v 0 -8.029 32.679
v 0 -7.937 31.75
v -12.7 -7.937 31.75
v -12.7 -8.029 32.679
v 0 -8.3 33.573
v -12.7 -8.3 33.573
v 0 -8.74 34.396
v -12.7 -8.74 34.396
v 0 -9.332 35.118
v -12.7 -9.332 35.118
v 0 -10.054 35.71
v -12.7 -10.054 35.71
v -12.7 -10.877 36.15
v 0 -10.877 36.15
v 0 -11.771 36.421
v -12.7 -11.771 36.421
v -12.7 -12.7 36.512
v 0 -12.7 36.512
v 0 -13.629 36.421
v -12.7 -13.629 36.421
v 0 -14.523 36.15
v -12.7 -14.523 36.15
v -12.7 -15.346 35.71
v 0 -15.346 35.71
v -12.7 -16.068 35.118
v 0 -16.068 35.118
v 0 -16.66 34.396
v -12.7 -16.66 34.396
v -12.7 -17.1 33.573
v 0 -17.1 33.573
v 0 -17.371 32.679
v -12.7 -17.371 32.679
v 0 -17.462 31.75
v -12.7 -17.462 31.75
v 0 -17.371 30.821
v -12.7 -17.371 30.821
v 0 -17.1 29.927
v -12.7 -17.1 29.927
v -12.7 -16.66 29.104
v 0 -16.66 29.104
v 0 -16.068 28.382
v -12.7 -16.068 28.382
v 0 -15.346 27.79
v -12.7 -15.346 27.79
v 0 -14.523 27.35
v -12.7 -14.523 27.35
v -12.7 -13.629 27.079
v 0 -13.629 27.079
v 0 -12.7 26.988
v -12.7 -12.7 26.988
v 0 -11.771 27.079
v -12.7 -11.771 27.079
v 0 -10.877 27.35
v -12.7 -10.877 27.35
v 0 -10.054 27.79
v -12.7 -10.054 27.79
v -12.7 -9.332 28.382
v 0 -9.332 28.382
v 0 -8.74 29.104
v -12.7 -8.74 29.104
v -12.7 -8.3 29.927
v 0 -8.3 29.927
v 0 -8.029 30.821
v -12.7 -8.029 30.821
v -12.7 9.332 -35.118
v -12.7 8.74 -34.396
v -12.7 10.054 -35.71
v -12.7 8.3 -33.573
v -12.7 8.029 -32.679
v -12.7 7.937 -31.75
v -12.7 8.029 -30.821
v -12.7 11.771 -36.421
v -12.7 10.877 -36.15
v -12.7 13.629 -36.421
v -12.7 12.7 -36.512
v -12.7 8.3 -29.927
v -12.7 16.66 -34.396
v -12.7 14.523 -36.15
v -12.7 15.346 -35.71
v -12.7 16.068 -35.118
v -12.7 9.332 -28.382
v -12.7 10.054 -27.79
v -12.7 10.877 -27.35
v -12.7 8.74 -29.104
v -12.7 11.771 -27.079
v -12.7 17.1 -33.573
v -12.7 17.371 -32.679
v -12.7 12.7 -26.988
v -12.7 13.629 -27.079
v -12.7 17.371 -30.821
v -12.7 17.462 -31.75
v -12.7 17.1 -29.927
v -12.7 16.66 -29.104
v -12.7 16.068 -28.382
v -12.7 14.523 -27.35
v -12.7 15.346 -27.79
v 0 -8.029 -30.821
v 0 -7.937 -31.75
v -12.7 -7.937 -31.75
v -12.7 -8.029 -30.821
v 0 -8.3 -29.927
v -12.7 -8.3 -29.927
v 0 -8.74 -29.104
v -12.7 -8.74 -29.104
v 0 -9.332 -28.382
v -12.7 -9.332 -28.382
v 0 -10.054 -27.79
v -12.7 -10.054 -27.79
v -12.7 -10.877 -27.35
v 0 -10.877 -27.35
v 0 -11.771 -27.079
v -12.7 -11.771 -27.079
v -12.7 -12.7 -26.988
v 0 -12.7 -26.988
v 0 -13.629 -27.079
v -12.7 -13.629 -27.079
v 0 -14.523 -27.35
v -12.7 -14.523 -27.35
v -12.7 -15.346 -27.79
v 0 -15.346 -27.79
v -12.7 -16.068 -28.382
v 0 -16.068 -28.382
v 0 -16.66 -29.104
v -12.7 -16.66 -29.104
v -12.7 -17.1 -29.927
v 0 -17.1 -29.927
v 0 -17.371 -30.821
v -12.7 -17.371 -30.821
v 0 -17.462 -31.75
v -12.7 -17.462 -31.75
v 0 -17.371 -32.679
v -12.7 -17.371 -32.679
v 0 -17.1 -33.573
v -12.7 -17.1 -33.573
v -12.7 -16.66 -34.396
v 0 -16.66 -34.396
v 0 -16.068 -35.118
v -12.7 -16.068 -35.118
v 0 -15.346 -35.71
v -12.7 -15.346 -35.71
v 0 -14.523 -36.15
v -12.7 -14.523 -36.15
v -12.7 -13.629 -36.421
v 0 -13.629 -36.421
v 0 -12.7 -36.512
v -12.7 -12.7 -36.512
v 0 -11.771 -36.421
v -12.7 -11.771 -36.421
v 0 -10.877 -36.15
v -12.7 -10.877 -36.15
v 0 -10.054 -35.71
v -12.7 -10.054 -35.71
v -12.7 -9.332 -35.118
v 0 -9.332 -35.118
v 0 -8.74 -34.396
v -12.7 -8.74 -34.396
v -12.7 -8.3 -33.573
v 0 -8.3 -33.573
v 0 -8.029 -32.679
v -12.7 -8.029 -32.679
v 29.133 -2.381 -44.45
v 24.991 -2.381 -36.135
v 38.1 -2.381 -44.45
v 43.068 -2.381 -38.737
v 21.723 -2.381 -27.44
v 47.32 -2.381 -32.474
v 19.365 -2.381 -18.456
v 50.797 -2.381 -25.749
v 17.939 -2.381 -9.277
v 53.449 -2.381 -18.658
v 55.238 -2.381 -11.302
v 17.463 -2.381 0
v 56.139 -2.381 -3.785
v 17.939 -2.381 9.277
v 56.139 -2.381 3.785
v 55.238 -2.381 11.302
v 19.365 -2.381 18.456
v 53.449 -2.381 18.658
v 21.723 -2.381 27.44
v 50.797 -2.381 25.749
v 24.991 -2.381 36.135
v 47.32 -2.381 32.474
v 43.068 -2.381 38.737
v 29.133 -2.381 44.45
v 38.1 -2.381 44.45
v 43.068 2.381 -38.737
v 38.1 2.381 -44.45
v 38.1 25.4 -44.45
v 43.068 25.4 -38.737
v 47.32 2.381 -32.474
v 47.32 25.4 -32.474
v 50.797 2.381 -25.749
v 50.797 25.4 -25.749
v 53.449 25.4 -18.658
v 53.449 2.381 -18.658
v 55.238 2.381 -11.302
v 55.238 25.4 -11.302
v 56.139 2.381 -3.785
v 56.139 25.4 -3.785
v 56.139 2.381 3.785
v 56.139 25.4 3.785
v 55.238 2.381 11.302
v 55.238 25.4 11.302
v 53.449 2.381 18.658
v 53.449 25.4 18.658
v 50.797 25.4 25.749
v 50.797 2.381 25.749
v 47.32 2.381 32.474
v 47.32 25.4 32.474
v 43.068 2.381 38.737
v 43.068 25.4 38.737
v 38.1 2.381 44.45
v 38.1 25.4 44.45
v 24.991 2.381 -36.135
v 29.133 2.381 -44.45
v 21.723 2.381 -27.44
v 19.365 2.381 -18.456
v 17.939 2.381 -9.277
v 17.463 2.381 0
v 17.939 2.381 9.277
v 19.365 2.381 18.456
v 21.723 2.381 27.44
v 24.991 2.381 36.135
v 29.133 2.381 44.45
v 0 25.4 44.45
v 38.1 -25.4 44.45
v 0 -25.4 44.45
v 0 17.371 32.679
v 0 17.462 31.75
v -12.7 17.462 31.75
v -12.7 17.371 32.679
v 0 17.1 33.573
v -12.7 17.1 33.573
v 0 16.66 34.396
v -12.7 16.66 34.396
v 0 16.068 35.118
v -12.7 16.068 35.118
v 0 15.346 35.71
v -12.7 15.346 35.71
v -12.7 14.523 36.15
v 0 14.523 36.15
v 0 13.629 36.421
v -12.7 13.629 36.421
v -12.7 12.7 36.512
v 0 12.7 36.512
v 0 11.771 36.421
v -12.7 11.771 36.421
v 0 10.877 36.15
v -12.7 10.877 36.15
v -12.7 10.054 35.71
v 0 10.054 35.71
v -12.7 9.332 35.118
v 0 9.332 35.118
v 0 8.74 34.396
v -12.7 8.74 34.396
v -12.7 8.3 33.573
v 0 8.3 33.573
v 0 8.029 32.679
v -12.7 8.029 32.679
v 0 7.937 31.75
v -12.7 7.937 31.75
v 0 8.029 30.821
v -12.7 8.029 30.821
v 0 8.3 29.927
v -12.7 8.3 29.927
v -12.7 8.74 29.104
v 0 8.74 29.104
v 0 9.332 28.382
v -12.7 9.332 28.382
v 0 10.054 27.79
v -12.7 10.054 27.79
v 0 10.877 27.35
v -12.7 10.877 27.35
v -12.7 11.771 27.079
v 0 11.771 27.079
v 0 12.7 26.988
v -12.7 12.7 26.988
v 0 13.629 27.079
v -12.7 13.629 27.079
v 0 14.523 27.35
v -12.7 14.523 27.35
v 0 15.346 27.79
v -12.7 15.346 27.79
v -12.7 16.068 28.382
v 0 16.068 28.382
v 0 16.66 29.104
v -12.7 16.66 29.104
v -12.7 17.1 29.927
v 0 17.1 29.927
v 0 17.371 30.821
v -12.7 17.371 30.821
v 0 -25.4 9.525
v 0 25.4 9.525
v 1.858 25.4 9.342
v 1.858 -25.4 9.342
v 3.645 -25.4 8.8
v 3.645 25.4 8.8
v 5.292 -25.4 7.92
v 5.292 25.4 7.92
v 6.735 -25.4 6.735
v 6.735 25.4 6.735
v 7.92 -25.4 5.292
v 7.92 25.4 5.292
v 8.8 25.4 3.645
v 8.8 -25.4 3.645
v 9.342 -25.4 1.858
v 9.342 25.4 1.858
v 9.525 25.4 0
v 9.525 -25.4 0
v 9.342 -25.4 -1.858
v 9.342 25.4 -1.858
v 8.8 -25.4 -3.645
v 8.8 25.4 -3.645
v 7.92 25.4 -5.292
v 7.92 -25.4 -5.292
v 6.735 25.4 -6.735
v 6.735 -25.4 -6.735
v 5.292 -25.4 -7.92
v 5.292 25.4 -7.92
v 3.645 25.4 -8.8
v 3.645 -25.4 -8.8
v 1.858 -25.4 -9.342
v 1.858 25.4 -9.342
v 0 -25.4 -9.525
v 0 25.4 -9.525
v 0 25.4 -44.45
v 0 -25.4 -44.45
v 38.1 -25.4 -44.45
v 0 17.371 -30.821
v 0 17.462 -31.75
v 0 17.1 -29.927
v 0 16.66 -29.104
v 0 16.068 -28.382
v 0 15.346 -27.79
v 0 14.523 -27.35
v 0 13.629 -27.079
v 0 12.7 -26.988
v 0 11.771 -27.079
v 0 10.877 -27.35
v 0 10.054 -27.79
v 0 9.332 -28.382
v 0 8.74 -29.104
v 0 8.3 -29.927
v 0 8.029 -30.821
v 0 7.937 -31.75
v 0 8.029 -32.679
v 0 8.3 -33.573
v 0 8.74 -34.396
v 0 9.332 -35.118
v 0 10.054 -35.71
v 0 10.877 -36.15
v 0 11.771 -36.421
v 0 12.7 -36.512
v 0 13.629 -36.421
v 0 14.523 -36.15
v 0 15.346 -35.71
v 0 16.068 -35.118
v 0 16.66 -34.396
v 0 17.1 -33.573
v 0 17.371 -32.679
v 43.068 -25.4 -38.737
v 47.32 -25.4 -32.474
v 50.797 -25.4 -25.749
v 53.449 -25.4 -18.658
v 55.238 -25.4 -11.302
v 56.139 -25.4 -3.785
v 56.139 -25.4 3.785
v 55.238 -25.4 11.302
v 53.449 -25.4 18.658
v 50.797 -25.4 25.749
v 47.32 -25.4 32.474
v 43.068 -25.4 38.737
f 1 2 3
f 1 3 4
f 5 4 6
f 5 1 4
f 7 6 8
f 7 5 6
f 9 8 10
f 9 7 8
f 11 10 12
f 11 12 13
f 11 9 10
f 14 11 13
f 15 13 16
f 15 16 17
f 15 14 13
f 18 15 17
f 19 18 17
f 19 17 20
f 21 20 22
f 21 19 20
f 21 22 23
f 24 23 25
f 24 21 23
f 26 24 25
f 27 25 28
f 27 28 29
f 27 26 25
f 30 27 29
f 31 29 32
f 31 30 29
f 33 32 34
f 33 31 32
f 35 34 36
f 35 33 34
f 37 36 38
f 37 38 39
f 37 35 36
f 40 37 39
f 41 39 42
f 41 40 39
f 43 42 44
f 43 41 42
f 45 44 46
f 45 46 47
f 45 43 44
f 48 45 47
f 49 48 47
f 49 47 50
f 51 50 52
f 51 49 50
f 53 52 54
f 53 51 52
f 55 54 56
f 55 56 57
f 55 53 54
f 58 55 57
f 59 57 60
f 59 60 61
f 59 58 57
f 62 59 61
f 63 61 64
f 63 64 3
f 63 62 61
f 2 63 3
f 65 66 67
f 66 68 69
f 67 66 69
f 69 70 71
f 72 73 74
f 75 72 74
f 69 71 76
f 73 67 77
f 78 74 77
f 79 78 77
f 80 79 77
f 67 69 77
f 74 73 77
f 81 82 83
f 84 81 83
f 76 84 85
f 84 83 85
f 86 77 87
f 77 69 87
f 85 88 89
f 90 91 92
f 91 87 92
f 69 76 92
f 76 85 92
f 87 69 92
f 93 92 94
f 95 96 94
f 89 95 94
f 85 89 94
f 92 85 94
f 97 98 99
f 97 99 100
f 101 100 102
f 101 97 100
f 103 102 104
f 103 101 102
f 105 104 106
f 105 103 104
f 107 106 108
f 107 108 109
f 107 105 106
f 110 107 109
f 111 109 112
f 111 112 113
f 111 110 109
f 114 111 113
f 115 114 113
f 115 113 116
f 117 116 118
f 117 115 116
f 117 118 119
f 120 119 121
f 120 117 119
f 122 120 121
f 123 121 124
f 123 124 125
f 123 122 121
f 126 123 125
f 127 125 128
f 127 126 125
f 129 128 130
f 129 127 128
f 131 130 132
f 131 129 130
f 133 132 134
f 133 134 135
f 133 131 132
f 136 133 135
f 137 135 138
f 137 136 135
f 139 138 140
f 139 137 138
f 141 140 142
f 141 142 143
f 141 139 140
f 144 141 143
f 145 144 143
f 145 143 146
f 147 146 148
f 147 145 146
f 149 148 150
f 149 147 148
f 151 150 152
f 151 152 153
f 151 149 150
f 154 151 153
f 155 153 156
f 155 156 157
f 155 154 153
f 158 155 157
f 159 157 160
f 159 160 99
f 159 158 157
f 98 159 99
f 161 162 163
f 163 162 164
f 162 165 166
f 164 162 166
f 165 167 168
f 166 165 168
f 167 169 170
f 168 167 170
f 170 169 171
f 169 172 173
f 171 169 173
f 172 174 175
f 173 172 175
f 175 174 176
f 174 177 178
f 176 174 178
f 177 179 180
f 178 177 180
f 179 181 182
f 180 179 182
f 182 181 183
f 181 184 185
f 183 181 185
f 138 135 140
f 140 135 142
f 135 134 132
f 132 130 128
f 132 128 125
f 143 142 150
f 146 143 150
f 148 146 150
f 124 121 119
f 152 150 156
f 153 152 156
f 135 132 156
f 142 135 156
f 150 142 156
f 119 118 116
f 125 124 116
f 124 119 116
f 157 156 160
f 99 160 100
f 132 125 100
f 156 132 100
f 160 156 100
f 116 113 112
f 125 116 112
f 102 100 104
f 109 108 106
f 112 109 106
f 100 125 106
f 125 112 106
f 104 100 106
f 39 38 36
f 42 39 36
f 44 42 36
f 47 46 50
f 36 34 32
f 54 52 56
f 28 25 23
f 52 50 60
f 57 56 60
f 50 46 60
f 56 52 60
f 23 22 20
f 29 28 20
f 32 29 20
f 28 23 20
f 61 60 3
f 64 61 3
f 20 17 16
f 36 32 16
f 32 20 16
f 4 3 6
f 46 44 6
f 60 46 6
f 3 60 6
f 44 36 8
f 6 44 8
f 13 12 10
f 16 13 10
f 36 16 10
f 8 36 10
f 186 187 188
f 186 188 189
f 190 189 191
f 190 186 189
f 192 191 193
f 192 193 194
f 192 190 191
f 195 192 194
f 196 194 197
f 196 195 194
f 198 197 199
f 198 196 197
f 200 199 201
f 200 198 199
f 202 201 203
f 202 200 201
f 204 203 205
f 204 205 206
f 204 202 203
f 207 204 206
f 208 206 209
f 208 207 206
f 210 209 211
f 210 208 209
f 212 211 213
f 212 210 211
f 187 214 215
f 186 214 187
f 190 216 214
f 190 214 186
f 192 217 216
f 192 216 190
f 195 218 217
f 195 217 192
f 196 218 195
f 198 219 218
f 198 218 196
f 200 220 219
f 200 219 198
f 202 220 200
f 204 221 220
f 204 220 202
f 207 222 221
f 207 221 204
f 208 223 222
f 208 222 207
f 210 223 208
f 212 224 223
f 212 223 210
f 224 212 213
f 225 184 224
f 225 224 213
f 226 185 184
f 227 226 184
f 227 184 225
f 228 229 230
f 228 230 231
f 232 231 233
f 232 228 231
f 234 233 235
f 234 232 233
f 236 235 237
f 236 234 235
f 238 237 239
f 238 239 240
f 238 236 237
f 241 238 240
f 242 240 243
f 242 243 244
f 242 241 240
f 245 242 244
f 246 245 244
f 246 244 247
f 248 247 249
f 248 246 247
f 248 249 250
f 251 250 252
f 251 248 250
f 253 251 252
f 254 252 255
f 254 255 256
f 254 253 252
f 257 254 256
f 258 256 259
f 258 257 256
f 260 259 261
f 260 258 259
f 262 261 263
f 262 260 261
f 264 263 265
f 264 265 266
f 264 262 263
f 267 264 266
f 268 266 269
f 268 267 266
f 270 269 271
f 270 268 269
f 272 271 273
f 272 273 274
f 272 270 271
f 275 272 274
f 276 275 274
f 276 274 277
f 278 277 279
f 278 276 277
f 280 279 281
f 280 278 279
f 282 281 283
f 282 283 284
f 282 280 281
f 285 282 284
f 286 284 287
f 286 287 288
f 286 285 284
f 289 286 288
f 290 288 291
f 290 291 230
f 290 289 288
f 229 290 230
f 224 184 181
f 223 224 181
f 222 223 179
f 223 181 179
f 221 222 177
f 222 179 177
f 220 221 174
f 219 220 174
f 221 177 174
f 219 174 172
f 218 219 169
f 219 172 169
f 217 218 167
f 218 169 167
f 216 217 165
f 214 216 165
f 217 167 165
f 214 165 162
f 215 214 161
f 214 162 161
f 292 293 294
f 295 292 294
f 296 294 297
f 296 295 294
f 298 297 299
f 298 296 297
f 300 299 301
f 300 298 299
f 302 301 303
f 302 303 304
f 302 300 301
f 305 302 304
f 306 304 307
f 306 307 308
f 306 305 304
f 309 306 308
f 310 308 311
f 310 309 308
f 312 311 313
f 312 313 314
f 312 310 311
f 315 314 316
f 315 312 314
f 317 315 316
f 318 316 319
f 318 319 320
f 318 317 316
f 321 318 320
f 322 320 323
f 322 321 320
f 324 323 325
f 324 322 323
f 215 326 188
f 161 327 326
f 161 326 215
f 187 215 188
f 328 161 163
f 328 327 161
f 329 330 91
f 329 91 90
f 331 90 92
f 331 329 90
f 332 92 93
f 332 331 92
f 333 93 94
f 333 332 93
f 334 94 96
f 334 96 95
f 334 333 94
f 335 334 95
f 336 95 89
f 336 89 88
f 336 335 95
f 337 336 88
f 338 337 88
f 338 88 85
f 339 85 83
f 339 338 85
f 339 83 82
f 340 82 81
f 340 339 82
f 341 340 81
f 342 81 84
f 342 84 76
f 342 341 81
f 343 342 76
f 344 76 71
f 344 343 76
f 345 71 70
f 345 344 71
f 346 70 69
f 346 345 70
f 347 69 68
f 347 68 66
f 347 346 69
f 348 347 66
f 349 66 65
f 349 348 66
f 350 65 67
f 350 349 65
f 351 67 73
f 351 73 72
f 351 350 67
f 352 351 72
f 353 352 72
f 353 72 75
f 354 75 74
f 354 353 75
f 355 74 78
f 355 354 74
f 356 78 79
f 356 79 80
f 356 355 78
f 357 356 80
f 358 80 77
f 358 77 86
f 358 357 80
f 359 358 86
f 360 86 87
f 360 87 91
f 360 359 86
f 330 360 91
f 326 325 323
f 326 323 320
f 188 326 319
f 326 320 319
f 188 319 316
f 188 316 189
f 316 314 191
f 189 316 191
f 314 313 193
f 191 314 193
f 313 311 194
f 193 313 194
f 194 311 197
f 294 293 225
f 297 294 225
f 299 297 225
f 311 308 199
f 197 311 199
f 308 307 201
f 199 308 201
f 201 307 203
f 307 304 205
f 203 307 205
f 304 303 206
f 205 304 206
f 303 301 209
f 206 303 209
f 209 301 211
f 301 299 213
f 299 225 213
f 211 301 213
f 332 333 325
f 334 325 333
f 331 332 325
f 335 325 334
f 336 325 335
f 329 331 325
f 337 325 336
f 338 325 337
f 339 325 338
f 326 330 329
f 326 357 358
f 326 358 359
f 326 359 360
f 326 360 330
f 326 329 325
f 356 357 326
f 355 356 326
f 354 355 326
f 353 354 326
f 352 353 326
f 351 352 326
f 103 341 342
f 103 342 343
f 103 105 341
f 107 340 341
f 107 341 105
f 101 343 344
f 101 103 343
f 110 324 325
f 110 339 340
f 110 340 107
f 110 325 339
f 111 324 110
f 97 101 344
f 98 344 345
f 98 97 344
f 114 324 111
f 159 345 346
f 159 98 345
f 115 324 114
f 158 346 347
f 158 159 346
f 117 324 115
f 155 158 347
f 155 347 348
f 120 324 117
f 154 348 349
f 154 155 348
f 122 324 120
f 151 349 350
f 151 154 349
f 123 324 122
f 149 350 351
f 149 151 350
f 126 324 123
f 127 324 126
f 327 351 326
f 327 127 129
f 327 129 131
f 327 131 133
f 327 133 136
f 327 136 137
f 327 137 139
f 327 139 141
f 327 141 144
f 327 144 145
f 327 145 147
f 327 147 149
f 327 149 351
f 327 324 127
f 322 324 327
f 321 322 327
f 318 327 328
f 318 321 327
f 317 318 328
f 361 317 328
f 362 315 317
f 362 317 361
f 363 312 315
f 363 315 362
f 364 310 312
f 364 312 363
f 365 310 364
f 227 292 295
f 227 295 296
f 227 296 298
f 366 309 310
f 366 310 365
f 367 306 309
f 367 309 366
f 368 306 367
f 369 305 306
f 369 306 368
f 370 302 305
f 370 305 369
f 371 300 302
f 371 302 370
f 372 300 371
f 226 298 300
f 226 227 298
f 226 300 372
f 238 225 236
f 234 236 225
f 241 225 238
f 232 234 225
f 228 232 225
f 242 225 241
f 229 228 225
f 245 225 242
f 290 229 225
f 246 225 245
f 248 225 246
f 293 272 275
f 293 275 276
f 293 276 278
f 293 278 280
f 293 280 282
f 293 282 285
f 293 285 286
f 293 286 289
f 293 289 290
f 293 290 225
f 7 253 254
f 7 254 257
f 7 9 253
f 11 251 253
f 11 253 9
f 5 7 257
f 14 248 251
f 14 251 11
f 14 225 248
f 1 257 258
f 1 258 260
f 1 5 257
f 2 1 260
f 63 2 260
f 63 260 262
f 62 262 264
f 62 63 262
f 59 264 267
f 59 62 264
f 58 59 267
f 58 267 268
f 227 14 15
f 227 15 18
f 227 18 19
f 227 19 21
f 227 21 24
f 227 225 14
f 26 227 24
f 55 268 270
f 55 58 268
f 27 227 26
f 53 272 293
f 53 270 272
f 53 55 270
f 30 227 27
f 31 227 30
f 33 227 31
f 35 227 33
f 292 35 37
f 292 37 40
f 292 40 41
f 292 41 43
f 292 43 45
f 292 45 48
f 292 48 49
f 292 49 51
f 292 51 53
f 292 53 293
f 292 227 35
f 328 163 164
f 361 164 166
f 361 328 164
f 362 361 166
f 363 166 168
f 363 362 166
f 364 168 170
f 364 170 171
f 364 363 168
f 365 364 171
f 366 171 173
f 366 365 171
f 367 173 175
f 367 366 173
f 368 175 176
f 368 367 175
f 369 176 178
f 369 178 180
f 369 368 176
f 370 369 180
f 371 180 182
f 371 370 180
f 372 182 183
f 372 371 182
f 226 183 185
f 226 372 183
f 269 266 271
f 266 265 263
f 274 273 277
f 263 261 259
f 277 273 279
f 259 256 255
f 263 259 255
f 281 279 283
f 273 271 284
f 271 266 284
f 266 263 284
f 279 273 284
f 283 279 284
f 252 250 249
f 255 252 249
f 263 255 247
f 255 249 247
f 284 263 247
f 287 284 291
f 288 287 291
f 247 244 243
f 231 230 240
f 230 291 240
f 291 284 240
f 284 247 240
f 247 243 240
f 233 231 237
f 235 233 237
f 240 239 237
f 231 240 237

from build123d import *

# Parameters (mm, degrees)
F1_DEPTH = 25.4
F2_R     = 90.4875
F3_DEPTH = 2.38125
F4_R     = 4.7625
F5_DEPTH = 12.7


with BuildPart() as f1:
    # F0 (on Front) → F1 (new body, symmetric)
    with BuildSketch(Plane.XZ):
        with BuildLine():
            Line((0, -9.525), (0, -44.45))
            Line((0, -44.45), (38.1, -44.45))
            ThreePointArc((38.1, -44.45), (56.251929, 0), (38.1, 44.45))
            Line((38.1, 44.45), (0, 44.45))
            Line((0, 44.45), (0, 9.525))
            ThreePointArc((0, 9.525), (9.525, 0), (0, -9.525))
        make_face()
    extrude(amount=F1_DEPTH, both=True)

    # F2 (on Front) → F3 (cut, symmetric)
    with BuildSketch(Plane.XZ):
        with Locations((107.95, 0)):
            Circle(F2_R)
    extrude(amount=F3_DEPTH, both=True, mode=Mode.SUBTRACT)

    # F4 (on Right) → F5 (join)
    with BuildSketch(Plane.YZ):
        with Locations((12.7, 31.75)):
            Circle(F4_R)
        with Locations((-12.7, 31.75)):
            Circle(F4_R)
        with Locations((-12.7, -31.75)):
            Circle(F4_R)
        with Locations((12.7, -31.75)):
            Circle(F4_R)
    extrude(amount=-F5_DEPTH)


solid = f1.part
